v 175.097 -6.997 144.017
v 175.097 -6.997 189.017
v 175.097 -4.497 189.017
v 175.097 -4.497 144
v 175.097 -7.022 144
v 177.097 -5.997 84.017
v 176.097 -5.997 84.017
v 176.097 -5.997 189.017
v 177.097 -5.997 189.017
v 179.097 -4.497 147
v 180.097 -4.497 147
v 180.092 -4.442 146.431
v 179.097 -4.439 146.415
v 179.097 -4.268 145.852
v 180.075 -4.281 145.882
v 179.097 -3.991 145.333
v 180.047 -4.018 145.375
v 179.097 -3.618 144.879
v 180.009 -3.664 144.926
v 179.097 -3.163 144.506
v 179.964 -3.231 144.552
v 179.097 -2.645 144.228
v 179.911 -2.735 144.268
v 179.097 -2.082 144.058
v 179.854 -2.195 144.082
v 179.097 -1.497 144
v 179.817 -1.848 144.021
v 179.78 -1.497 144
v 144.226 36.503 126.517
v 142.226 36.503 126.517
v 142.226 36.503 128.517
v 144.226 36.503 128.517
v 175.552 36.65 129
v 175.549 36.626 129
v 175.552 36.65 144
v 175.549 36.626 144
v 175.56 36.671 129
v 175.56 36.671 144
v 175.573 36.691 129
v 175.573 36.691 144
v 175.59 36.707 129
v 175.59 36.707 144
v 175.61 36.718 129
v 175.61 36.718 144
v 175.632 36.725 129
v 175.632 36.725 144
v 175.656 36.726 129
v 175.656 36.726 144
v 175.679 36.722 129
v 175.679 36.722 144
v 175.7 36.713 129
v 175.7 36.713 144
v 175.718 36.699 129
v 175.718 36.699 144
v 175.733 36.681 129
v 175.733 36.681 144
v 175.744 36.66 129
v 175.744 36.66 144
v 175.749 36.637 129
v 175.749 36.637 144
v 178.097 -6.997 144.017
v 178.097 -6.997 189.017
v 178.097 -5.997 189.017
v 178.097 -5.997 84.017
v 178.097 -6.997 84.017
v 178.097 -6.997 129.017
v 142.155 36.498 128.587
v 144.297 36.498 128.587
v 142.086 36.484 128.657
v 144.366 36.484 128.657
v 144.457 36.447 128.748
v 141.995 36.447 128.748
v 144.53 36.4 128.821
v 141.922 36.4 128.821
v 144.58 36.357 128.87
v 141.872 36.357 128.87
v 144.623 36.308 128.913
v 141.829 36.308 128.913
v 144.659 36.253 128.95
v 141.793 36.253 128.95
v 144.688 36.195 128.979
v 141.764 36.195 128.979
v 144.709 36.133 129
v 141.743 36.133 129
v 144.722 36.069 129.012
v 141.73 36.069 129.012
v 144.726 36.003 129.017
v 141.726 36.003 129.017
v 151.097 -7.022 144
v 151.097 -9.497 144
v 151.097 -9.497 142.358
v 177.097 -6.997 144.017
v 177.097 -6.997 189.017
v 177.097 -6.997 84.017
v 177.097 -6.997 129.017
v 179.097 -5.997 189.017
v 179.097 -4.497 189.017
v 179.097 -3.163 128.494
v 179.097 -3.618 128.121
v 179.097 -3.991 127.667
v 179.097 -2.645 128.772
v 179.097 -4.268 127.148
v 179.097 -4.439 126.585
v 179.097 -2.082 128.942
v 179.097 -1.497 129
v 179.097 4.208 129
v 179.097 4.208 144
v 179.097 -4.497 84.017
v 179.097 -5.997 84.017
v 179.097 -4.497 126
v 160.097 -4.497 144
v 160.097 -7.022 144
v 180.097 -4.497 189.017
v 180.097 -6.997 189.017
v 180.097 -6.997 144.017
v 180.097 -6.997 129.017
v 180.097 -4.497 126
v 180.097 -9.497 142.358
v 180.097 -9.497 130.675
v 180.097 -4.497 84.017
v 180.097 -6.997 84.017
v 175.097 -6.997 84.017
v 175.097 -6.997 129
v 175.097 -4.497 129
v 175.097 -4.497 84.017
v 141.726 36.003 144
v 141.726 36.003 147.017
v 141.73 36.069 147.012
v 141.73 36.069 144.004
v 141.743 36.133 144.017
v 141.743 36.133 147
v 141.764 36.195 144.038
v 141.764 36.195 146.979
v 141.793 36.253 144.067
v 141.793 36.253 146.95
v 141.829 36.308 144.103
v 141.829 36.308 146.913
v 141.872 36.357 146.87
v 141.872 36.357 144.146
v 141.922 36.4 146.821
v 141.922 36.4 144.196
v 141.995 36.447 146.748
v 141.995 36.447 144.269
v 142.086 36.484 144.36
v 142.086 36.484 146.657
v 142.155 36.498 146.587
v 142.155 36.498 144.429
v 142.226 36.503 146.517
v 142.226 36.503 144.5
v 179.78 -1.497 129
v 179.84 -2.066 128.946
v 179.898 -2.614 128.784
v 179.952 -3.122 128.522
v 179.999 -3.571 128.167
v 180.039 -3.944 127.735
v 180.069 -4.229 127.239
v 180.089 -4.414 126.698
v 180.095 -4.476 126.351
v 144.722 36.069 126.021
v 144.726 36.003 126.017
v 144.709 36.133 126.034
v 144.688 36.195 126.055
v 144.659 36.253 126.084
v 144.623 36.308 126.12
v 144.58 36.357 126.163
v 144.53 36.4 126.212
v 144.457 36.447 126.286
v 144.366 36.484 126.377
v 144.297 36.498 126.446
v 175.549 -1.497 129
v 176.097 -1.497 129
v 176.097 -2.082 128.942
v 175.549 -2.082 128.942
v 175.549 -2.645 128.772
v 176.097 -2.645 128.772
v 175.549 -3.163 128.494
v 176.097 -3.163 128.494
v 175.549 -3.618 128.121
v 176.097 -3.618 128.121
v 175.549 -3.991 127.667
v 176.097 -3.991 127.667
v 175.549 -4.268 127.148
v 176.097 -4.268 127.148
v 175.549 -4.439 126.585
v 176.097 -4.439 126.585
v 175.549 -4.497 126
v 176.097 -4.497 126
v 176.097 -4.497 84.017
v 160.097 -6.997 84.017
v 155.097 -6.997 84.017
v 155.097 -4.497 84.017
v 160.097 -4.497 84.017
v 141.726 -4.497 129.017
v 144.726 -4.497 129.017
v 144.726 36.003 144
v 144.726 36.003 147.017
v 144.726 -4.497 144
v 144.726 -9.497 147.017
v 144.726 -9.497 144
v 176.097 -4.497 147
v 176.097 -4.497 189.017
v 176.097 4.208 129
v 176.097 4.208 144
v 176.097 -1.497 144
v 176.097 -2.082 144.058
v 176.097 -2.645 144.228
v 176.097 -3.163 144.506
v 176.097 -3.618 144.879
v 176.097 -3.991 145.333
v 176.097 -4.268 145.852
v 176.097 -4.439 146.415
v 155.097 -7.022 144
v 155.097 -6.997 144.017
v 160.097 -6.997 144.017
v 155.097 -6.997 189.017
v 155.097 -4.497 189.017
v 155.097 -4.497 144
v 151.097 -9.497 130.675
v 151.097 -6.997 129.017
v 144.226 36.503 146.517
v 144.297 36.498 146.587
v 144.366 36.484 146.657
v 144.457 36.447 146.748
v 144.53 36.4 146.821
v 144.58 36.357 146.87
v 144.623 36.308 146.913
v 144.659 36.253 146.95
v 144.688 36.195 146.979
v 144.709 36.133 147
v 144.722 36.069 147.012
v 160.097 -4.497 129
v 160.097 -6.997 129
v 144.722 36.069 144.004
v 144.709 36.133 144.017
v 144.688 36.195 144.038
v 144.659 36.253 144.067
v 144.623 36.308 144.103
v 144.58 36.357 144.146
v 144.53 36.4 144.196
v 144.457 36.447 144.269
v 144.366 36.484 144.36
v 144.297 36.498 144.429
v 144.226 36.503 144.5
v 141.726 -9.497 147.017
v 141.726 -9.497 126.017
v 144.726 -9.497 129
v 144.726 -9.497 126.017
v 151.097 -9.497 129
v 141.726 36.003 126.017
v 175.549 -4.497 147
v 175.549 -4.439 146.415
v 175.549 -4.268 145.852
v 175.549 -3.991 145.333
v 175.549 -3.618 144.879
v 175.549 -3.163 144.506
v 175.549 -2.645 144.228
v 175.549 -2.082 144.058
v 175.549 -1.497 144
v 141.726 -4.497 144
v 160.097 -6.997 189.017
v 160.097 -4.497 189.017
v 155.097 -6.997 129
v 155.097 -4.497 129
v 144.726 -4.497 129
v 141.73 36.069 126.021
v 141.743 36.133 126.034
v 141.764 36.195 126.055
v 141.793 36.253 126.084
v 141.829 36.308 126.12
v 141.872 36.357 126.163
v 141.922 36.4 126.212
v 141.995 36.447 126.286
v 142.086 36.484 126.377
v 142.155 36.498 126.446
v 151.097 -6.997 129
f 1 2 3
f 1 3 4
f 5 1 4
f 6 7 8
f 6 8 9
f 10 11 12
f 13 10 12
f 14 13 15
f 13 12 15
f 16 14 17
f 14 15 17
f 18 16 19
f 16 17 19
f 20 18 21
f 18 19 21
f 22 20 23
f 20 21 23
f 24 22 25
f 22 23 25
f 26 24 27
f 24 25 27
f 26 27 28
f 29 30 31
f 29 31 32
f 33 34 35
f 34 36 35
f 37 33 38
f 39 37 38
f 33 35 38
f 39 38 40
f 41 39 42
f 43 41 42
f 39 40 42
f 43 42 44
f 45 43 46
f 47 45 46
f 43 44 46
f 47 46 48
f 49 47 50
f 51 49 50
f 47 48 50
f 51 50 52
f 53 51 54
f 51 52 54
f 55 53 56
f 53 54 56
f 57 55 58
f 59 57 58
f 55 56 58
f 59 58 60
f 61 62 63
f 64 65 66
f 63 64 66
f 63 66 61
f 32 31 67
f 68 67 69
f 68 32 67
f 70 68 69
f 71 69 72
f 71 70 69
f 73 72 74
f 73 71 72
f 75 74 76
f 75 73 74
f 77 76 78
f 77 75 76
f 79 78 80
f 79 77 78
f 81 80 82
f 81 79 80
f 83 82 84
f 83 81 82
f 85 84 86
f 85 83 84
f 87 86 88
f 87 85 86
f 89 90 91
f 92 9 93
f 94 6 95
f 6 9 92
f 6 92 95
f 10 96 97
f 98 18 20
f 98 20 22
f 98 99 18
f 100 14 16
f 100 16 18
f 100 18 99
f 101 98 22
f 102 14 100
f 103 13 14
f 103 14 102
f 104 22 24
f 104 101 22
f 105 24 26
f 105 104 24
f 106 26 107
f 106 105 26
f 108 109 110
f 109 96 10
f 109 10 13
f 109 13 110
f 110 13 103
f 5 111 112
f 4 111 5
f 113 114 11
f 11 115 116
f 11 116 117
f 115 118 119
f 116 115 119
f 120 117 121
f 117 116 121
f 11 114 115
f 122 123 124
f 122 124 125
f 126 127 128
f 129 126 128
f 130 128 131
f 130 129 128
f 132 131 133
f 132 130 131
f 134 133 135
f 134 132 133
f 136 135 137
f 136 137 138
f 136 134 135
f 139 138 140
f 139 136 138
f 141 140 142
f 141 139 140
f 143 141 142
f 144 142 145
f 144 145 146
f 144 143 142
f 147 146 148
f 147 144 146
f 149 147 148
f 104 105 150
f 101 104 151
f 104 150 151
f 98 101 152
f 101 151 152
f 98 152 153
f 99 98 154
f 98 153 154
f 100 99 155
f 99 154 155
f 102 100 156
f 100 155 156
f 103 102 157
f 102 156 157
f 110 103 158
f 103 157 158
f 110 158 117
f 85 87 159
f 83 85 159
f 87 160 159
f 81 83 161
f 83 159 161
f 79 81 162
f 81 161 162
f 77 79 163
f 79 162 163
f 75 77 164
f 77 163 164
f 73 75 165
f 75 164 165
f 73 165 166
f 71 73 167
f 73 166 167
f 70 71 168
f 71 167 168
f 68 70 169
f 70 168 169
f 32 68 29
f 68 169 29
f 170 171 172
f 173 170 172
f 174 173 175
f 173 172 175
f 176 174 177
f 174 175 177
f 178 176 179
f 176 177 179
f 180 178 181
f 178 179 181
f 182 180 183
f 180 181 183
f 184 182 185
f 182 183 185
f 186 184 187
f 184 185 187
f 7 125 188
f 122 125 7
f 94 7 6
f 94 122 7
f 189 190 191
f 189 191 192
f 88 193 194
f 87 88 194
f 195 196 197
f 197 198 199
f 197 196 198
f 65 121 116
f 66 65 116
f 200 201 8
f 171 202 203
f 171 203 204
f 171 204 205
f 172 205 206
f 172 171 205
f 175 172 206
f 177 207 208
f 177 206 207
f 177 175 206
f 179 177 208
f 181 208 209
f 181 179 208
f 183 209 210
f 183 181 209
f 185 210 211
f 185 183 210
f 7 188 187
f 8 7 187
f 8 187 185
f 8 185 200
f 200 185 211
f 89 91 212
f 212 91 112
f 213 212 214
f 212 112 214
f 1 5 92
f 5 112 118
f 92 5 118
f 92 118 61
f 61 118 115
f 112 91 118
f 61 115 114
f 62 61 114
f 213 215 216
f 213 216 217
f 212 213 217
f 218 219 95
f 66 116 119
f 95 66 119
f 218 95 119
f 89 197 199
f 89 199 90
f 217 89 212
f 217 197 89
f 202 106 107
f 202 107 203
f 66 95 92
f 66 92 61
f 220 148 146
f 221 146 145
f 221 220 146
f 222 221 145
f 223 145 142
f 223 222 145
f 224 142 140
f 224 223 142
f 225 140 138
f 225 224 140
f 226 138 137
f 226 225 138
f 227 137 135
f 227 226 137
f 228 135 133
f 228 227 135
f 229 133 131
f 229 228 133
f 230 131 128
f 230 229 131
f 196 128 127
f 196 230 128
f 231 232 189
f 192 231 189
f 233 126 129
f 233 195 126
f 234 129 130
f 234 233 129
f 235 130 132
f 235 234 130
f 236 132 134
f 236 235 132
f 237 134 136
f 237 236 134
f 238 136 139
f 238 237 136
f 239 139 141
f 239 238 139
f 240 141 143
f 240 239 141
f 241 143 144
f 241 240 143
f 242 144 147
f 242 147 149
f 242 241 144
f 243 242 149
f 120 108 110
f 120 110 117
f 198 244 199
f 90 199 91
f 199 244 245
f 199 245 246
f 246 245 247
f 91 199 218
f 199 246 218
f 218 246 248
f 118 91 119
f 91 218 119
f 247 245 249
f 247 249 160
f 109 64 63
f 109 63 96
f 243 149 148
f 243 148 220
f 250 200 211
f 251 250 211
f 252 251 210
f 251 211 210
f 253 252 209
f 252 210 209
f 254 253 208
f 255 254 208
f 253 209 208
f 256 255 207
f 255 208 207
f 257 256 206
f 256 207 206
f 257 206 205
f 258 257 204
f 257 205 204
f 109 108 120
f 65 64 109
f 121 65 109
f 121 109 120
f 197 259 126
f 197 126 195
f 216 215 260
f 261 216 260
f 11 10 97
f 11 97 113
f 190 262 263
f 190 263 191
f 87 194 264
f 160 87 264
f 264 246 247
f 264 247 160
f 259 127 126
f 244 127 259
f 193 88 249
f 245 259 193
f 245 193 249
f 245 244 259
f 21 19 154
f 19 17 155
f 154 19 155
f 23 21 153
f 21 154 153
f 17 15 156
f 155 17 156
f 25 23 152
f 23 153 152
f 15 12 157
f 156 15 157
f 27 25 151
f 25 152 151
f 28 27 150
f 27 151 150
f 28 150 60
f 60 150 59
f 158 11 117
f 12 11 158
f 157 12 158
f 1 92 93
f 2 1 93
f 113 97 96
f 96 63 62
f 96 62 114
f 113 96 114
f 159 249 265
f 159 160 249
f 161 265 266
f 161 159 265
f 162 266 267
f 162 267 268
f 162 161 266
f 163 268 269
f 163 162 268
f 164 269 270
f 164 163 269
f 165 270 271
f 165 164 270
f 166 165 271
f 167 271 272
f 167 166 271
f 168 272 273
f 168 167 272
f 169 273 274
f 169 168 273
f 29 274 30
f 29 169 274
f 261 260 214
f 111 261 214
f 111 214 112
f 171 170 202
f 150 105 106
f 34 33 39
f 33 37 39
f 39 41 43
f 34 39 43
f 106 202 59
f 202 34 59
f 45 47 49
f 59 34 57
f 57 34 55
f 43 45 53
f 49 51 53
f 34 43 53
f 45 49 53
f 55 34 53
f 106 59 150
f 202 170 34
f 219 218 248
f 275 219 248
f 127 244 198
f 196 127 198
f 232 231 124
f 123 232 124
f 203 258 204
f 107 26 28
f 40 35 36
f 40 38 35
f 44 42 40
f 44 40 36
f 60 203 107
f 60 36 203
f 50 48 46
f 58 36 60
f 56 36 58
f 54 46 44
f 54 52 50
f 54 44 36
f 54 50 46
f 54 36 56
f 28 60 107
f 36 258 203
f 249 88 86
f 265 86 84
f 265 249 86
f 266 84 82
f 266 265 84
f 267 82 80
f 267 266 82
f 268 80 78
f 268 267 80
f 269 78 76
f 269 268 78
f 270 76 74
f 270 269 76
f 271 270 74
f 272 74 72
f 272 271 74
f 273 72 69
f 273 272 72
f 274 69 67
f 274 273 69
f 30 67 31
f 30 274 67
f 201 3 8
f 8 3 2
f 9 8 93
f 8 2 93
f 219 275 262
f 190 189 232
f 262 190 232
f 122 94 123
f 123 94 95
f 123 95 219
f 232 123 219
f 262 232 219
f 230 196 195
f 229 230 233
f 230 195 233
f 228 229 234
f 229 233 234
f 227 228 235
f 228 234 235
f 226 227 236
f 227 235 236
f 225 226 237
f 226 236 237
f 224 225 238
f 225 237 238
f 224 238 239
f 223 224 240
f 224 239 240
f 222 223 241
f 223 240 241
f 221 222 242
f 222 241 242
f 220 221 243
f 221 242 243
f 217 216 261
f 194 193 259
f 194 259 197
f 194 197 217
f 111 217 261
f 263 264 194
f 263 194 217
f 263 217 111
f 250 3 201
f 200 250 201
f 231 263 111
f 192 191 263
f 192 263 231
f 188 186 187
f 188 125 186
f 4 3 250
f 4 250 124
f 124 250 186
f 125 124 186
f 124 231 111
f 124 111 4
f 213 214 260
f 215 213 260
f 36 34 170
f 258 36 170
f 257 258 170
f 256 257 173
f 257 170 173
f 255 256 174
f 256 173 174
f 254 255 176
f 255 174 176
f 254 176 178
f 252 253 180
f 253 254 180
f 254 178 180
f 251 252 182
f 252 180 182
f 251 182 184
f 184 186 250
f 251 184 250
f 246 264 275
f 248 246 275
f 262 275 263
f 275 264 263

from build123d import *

# Parameters (mm, degrees)
SKETCH1_W           = 5
SKETCH1_H           = 105
BOSS_EXTRUDE1_DEPTH = 5
BOSS_EXTRUDE2_START = 129
BOSS_EXTRUDE2_DEPTH = 15
BOSS_EXTRUDE3_START = 129
SKETCH3_W           = 33.371379062
SKETCH3_H           = 5
BOSS_EXTRUDE3_DEPTH = 15
SKETCH4_W           = 3
SKETCH4_H           = 3.016632821
SKETCH4_H_2         = 3
BOSS_EXTRUDE4_DEPTH = 46
FILLET1_R           = 0.5
FILLET2_R           = 0.1
FILLET3_R           = 3
LPATTERN2_COUNT     = 2
LPATTERN2_PITCH     = 20
CUT_EXTRUDE3_DEPTH  = 29
CUT_EXTRUDE4_DEPTH  = 106


with BuildPart() as part:
    # Sketch1 → Boss-Extrude1 (new body)
    with BuildSketch(Plane(origin=(0, -9.496519724, 0), x_dir=(1, 0, 0), z_dir=(0, 1, 0))):
        with Locations((177.597354305, -136.516632821)):
            Rectangle(SKETCH1_W, SKETCH1_H)
    boss_extrude1 = extrude(amount=BOSS_EXTRUDE1_DEPTH)

    # Sketch2 → Boss-Extrude2 (add)
    with BuildSketch(Plane(origin=(0, -9.496519724, 0), x_dir=(1, 0, 0), z_dir=(0, 0, 1)).offset(BOSS_EXTRUDE2_START)):
        Polygon((180.097354305, 5), (175.549258031, 48.019997969), (175.549258031, 5), align=None)
    extrude(amount=BOSS_EXTRUDE2_DEPTH)

    # Sketch3 → Boss-Extrude3 (add)
    with BuildSketch(Plane(origin=(0, -9.496519724, 0), x_dir=(1, 0, 0), z_dir=(0, 0, 1)).offset(BOSS_EXTRUDE3_START)):
        with Locations((158.411664774, 2.5)):
            Rectangle(SKETCH3_W, SKETCH3_H)
    extrude(amount=BOSS_EXTRUDE3_DEPTH)

    # Sketch4 → Boss-Extrude4 (add)
    with BuildSketch(Plane(origin=(0, -9.496519724, 0), x_dir=(1, 0, 0), z_dir=(0, 1, 0))):
        with Locations((143.225975243, -145.508316411)):
            Rectangle(SKETCH4_W, SKETCH4_H)
        with Locations((143.225975243, -127.516632821)):
            Rectangle(SKETCH4_W, SKETCH4_H_2)
    extrude(amount=BOSS_EXTRUDE4_DEPTH)

    # Fillet1
    fillet1_edges = [part.edges().sort_by_distance(p)[0] for p in [
        (144.725975243, 36.503480276, 145.50831641),
        (143.225975243, 36.503480276, 144),
        (141.725975243, 36.503480276, 145.50831641),
        (143.225975243, 36.503480276, 147.016632821),
        (144.725975243, 36.503480276, 127.516632821),
        (143.225975243, 36.503480276, 126.016632821),
        (141.725975243, 36.503480276, 127.516632821),
        (143.225975243, 36.503480276, 129.016632821),
    ]]
    fillet(fillet1_edges, radius=FILLET1_R)

    # Fillet2
    fillet2_edges = [part.edges().sort_by_distance(p)[0] for p in [
        (175.549258031, 38.523478245, 136.5),
    ]]
    fillet(fillet2_edges, radius=FILLET2_R)

    # Fillet3
    fillet3_edges = [part.edges().sort_by_distance(p)[0] for p in [
        (177.823306168, -4.496519724, 129),
        (177.823306168, -4.496519724, 144),
    ]]
    fillet(fillet3_edges, radius=FILLET3_R)

    # LPattern2: Boss-Extrude1 ×2
    with Locations(*[(-i * LPATTERN2_PITCH, 0, 0) for i in range(1, LPATTERN2_COUNT)]):
        add(boss_extrude1)

    # Sketch7 → Cut-Extrude3 (cut)
    with BuildSketch(Plane(origin=(180.097354305, 0, 0), x_dir=(0, 0, -1), z_dir=(1, 0, 0))):
        Polygon((-129.016632821, -6.996519724), (-130.674945216, -9.496519724), (-84.016632821, -9.496519724), (-84.016632821, -6.996519724), align=None)
        Polygon((-189.016632821, -6.996519724), (-189.016632821, -9.496519724), (-142.358320426, -9.496519724), (-144.016632821, -6.996519724), align=None)
    extrude(amount=-CUT_EXTRUDE3_DEPTH, mode=Mode.SUBTRACT)

    # Sketch11 → Cut-Extrude4 (cut)
    with BuildSketch(Plane(origin=(0, 0, 84.016632821), x_dir=(-1, 0, 0), z_dir=(0, 0, -1))):
        Polygon((-178.097354305, -6.996519724), (-178.097354305, -5.996519724), (-179.097354305, -5.996519724), (-179.097354305, 4.208174), (-176.097354305, 4.208174), (-176.097354305, -5.996519724), (-177.097354305, -5.996519724), (-177.097354305, -6.996519724), align=None)
    extrude(amount=-CUT_EXTRUDE4_DEPTH, mode=Mode.SUBTRACT)


solid = part.part
